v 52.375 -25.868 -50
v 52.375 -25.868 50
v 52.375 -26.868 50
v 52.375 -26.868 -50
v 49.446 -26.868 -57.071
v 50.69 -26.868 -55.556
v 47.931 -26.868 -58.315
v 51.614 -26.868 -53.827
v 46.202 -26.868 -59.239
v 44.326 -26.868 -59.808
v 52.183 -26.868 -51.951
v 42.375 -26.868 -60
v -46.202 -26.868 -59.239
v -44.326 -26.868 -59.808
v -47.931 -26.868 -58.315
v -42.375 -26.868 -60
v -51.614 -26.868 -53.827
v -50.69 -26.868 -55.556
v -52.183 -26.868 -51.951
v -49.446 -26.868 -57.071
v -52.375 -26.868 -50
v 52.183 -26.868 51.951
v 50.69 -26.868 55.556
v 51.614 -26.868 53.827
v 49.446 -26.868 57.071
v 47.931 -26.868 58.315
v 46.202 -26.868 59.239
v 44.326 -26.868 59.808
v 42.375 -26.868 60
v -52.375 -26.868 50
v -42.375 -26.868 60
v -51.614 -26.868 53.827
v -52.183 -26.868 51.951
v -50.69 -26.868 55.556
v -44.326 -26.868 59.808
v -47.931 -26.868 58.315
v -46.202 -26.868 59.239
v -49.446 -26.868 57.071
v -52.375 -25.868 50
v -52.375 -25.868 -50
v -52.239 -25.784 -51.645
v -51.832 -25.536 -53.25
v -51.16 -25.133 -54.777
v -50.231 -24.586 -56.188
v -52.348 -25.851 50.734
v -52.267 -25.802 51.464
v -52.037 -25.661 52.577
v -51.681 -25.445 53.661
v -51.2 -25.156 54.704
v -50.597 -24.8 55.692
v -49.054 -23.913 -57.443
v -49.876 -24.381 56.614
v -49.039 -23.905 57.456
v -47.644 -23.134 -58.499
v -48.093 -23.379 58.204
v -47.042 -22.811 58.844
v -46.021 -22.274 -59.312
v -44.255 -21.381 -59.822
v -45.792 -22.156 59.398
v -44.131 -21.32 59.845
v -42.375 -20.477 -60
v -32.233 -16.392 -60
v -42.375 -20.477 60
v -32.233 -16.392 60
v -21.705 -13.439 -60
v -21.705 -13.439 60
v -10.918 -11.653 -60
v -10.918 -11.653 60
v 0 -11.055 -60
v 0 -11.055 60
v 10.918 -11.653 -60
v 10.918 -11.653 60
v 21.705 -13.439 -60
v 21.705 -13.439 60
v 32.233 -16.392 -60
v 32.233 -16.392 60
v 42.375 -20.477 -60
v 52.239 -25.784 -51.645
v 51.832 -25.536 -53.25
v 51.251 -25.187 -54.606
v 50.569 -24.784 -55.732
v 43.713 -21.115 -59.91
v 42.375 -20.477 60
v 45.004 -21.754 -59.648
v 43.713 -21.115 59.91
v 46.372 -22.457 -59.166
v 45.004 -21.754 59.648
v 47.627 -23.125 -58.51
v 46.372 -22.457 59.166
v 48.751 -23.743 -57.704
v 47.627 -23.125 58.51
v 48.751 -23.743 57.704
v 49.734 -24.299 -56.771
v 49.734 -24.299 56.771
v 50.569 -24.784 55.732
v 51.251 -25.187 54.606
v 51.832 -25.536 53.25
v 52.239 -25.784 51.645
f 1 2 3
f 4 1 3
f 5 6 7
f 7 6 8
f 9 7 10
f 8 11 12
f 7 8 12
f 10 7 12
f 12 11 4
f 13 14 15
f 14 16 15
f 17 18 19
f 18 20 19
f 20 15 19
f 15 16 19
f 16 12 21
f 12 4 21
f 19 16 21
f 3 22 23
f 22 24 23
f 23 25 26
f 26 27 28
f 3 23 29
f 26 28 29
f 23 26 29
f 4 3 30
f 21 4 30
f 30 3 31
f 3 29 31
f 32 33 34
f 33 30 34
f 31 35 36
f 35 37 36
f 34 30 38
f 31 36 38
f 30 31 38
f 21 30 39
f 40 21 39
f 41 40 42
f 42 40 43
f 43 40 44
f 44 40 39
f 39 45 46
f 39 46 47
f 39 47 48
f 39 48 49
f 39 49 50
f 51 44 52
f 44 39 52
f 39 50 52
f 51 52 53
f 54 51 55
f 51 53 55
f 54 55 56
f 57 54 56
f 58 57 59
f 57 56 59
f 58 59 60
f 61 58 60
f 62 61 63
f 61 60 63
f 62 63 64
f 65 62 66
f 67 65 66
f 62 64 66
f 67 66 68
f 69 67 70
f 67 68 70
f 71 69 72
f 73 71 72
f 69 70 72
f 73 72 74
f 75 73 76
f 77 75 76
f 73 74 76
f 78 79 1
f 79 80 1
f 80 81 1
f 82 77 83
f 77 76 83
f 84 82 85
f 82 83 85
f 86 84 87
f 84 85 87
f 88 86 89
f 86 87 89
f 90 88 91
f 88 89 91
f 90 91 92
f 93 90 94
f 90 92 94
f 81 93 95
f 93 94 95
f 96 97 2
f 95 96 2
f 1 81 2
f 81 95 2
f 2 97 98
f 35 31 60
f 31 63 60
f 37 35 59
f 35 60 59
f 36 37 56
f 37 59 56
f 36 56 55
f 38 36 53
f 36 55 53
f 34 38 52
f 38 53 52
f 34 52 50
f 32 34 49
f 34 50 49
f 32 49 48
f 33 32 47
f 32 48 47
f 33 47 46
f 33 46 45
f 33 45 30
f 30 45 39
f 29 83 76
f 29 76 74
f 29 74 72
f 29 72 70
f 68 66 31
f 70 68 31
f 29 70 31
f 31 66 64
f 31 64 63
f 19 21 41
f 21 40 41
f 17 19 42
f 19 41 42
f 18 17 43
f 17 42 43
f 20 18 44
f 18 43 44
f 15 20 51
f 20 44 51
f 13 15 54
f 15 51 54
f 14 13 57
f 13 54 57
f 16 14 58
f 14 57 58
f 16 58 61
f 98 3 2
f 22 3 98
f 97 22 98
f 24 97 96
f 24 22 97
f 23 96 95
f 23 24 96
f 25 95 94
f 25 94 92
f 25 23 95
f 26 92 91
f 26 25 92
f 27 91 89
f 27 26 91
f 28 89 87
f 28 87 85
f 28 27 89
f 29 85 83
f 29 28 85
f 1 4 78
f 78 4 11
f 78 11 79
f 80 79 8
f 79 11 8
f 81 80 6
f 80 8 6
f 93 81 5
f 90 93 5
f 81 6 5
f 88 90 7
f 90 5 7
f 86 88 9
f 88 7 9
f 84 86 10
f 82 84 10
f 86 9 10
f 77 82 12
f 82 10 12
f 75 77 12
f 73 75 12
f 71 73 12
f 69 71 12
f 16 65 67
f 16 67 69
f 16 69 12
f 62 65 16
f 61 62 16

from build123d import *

# Parameters (mm, degrees)
BOSS_EXTRUDE1_DEPTH = 60
FILLET1_R           = 10


with BuildPart() as part:
    # Sketch1 → Boss-Extrude1 (new, symmetric)
    with BuildSketch(Plane.XY):
        with BuildLine():
            Line((52.375, -25.867869753), (52.375, -26.867869753))
            Line((52.375, -26.867869753), (-52.375, -26.867869753))
            Line((-52.375, -26.867869753), (-52.375, -25.867869753))
            ThreePointArc((-52.375, -25.867869753), (0, -11.055071697), (52.375, -25.867869753))
        make_face()
    extrude(amount=BOSS_EXTRUDE1_DEPTH, both=True)

    # Fillet1
    fillet1_edges = [part.edges().sort_by_distance(p)[0] for p in [
        (52.375, -26.367869753, 60),
        (52.375, -26.367869753, -60),
        (-52.375, -26.367869753, -60),
        (-52.375, -26.367869753, 60),
    ]]
    fillet(fillet1_edges, radius=FILLET1_R)


solid = part.part
